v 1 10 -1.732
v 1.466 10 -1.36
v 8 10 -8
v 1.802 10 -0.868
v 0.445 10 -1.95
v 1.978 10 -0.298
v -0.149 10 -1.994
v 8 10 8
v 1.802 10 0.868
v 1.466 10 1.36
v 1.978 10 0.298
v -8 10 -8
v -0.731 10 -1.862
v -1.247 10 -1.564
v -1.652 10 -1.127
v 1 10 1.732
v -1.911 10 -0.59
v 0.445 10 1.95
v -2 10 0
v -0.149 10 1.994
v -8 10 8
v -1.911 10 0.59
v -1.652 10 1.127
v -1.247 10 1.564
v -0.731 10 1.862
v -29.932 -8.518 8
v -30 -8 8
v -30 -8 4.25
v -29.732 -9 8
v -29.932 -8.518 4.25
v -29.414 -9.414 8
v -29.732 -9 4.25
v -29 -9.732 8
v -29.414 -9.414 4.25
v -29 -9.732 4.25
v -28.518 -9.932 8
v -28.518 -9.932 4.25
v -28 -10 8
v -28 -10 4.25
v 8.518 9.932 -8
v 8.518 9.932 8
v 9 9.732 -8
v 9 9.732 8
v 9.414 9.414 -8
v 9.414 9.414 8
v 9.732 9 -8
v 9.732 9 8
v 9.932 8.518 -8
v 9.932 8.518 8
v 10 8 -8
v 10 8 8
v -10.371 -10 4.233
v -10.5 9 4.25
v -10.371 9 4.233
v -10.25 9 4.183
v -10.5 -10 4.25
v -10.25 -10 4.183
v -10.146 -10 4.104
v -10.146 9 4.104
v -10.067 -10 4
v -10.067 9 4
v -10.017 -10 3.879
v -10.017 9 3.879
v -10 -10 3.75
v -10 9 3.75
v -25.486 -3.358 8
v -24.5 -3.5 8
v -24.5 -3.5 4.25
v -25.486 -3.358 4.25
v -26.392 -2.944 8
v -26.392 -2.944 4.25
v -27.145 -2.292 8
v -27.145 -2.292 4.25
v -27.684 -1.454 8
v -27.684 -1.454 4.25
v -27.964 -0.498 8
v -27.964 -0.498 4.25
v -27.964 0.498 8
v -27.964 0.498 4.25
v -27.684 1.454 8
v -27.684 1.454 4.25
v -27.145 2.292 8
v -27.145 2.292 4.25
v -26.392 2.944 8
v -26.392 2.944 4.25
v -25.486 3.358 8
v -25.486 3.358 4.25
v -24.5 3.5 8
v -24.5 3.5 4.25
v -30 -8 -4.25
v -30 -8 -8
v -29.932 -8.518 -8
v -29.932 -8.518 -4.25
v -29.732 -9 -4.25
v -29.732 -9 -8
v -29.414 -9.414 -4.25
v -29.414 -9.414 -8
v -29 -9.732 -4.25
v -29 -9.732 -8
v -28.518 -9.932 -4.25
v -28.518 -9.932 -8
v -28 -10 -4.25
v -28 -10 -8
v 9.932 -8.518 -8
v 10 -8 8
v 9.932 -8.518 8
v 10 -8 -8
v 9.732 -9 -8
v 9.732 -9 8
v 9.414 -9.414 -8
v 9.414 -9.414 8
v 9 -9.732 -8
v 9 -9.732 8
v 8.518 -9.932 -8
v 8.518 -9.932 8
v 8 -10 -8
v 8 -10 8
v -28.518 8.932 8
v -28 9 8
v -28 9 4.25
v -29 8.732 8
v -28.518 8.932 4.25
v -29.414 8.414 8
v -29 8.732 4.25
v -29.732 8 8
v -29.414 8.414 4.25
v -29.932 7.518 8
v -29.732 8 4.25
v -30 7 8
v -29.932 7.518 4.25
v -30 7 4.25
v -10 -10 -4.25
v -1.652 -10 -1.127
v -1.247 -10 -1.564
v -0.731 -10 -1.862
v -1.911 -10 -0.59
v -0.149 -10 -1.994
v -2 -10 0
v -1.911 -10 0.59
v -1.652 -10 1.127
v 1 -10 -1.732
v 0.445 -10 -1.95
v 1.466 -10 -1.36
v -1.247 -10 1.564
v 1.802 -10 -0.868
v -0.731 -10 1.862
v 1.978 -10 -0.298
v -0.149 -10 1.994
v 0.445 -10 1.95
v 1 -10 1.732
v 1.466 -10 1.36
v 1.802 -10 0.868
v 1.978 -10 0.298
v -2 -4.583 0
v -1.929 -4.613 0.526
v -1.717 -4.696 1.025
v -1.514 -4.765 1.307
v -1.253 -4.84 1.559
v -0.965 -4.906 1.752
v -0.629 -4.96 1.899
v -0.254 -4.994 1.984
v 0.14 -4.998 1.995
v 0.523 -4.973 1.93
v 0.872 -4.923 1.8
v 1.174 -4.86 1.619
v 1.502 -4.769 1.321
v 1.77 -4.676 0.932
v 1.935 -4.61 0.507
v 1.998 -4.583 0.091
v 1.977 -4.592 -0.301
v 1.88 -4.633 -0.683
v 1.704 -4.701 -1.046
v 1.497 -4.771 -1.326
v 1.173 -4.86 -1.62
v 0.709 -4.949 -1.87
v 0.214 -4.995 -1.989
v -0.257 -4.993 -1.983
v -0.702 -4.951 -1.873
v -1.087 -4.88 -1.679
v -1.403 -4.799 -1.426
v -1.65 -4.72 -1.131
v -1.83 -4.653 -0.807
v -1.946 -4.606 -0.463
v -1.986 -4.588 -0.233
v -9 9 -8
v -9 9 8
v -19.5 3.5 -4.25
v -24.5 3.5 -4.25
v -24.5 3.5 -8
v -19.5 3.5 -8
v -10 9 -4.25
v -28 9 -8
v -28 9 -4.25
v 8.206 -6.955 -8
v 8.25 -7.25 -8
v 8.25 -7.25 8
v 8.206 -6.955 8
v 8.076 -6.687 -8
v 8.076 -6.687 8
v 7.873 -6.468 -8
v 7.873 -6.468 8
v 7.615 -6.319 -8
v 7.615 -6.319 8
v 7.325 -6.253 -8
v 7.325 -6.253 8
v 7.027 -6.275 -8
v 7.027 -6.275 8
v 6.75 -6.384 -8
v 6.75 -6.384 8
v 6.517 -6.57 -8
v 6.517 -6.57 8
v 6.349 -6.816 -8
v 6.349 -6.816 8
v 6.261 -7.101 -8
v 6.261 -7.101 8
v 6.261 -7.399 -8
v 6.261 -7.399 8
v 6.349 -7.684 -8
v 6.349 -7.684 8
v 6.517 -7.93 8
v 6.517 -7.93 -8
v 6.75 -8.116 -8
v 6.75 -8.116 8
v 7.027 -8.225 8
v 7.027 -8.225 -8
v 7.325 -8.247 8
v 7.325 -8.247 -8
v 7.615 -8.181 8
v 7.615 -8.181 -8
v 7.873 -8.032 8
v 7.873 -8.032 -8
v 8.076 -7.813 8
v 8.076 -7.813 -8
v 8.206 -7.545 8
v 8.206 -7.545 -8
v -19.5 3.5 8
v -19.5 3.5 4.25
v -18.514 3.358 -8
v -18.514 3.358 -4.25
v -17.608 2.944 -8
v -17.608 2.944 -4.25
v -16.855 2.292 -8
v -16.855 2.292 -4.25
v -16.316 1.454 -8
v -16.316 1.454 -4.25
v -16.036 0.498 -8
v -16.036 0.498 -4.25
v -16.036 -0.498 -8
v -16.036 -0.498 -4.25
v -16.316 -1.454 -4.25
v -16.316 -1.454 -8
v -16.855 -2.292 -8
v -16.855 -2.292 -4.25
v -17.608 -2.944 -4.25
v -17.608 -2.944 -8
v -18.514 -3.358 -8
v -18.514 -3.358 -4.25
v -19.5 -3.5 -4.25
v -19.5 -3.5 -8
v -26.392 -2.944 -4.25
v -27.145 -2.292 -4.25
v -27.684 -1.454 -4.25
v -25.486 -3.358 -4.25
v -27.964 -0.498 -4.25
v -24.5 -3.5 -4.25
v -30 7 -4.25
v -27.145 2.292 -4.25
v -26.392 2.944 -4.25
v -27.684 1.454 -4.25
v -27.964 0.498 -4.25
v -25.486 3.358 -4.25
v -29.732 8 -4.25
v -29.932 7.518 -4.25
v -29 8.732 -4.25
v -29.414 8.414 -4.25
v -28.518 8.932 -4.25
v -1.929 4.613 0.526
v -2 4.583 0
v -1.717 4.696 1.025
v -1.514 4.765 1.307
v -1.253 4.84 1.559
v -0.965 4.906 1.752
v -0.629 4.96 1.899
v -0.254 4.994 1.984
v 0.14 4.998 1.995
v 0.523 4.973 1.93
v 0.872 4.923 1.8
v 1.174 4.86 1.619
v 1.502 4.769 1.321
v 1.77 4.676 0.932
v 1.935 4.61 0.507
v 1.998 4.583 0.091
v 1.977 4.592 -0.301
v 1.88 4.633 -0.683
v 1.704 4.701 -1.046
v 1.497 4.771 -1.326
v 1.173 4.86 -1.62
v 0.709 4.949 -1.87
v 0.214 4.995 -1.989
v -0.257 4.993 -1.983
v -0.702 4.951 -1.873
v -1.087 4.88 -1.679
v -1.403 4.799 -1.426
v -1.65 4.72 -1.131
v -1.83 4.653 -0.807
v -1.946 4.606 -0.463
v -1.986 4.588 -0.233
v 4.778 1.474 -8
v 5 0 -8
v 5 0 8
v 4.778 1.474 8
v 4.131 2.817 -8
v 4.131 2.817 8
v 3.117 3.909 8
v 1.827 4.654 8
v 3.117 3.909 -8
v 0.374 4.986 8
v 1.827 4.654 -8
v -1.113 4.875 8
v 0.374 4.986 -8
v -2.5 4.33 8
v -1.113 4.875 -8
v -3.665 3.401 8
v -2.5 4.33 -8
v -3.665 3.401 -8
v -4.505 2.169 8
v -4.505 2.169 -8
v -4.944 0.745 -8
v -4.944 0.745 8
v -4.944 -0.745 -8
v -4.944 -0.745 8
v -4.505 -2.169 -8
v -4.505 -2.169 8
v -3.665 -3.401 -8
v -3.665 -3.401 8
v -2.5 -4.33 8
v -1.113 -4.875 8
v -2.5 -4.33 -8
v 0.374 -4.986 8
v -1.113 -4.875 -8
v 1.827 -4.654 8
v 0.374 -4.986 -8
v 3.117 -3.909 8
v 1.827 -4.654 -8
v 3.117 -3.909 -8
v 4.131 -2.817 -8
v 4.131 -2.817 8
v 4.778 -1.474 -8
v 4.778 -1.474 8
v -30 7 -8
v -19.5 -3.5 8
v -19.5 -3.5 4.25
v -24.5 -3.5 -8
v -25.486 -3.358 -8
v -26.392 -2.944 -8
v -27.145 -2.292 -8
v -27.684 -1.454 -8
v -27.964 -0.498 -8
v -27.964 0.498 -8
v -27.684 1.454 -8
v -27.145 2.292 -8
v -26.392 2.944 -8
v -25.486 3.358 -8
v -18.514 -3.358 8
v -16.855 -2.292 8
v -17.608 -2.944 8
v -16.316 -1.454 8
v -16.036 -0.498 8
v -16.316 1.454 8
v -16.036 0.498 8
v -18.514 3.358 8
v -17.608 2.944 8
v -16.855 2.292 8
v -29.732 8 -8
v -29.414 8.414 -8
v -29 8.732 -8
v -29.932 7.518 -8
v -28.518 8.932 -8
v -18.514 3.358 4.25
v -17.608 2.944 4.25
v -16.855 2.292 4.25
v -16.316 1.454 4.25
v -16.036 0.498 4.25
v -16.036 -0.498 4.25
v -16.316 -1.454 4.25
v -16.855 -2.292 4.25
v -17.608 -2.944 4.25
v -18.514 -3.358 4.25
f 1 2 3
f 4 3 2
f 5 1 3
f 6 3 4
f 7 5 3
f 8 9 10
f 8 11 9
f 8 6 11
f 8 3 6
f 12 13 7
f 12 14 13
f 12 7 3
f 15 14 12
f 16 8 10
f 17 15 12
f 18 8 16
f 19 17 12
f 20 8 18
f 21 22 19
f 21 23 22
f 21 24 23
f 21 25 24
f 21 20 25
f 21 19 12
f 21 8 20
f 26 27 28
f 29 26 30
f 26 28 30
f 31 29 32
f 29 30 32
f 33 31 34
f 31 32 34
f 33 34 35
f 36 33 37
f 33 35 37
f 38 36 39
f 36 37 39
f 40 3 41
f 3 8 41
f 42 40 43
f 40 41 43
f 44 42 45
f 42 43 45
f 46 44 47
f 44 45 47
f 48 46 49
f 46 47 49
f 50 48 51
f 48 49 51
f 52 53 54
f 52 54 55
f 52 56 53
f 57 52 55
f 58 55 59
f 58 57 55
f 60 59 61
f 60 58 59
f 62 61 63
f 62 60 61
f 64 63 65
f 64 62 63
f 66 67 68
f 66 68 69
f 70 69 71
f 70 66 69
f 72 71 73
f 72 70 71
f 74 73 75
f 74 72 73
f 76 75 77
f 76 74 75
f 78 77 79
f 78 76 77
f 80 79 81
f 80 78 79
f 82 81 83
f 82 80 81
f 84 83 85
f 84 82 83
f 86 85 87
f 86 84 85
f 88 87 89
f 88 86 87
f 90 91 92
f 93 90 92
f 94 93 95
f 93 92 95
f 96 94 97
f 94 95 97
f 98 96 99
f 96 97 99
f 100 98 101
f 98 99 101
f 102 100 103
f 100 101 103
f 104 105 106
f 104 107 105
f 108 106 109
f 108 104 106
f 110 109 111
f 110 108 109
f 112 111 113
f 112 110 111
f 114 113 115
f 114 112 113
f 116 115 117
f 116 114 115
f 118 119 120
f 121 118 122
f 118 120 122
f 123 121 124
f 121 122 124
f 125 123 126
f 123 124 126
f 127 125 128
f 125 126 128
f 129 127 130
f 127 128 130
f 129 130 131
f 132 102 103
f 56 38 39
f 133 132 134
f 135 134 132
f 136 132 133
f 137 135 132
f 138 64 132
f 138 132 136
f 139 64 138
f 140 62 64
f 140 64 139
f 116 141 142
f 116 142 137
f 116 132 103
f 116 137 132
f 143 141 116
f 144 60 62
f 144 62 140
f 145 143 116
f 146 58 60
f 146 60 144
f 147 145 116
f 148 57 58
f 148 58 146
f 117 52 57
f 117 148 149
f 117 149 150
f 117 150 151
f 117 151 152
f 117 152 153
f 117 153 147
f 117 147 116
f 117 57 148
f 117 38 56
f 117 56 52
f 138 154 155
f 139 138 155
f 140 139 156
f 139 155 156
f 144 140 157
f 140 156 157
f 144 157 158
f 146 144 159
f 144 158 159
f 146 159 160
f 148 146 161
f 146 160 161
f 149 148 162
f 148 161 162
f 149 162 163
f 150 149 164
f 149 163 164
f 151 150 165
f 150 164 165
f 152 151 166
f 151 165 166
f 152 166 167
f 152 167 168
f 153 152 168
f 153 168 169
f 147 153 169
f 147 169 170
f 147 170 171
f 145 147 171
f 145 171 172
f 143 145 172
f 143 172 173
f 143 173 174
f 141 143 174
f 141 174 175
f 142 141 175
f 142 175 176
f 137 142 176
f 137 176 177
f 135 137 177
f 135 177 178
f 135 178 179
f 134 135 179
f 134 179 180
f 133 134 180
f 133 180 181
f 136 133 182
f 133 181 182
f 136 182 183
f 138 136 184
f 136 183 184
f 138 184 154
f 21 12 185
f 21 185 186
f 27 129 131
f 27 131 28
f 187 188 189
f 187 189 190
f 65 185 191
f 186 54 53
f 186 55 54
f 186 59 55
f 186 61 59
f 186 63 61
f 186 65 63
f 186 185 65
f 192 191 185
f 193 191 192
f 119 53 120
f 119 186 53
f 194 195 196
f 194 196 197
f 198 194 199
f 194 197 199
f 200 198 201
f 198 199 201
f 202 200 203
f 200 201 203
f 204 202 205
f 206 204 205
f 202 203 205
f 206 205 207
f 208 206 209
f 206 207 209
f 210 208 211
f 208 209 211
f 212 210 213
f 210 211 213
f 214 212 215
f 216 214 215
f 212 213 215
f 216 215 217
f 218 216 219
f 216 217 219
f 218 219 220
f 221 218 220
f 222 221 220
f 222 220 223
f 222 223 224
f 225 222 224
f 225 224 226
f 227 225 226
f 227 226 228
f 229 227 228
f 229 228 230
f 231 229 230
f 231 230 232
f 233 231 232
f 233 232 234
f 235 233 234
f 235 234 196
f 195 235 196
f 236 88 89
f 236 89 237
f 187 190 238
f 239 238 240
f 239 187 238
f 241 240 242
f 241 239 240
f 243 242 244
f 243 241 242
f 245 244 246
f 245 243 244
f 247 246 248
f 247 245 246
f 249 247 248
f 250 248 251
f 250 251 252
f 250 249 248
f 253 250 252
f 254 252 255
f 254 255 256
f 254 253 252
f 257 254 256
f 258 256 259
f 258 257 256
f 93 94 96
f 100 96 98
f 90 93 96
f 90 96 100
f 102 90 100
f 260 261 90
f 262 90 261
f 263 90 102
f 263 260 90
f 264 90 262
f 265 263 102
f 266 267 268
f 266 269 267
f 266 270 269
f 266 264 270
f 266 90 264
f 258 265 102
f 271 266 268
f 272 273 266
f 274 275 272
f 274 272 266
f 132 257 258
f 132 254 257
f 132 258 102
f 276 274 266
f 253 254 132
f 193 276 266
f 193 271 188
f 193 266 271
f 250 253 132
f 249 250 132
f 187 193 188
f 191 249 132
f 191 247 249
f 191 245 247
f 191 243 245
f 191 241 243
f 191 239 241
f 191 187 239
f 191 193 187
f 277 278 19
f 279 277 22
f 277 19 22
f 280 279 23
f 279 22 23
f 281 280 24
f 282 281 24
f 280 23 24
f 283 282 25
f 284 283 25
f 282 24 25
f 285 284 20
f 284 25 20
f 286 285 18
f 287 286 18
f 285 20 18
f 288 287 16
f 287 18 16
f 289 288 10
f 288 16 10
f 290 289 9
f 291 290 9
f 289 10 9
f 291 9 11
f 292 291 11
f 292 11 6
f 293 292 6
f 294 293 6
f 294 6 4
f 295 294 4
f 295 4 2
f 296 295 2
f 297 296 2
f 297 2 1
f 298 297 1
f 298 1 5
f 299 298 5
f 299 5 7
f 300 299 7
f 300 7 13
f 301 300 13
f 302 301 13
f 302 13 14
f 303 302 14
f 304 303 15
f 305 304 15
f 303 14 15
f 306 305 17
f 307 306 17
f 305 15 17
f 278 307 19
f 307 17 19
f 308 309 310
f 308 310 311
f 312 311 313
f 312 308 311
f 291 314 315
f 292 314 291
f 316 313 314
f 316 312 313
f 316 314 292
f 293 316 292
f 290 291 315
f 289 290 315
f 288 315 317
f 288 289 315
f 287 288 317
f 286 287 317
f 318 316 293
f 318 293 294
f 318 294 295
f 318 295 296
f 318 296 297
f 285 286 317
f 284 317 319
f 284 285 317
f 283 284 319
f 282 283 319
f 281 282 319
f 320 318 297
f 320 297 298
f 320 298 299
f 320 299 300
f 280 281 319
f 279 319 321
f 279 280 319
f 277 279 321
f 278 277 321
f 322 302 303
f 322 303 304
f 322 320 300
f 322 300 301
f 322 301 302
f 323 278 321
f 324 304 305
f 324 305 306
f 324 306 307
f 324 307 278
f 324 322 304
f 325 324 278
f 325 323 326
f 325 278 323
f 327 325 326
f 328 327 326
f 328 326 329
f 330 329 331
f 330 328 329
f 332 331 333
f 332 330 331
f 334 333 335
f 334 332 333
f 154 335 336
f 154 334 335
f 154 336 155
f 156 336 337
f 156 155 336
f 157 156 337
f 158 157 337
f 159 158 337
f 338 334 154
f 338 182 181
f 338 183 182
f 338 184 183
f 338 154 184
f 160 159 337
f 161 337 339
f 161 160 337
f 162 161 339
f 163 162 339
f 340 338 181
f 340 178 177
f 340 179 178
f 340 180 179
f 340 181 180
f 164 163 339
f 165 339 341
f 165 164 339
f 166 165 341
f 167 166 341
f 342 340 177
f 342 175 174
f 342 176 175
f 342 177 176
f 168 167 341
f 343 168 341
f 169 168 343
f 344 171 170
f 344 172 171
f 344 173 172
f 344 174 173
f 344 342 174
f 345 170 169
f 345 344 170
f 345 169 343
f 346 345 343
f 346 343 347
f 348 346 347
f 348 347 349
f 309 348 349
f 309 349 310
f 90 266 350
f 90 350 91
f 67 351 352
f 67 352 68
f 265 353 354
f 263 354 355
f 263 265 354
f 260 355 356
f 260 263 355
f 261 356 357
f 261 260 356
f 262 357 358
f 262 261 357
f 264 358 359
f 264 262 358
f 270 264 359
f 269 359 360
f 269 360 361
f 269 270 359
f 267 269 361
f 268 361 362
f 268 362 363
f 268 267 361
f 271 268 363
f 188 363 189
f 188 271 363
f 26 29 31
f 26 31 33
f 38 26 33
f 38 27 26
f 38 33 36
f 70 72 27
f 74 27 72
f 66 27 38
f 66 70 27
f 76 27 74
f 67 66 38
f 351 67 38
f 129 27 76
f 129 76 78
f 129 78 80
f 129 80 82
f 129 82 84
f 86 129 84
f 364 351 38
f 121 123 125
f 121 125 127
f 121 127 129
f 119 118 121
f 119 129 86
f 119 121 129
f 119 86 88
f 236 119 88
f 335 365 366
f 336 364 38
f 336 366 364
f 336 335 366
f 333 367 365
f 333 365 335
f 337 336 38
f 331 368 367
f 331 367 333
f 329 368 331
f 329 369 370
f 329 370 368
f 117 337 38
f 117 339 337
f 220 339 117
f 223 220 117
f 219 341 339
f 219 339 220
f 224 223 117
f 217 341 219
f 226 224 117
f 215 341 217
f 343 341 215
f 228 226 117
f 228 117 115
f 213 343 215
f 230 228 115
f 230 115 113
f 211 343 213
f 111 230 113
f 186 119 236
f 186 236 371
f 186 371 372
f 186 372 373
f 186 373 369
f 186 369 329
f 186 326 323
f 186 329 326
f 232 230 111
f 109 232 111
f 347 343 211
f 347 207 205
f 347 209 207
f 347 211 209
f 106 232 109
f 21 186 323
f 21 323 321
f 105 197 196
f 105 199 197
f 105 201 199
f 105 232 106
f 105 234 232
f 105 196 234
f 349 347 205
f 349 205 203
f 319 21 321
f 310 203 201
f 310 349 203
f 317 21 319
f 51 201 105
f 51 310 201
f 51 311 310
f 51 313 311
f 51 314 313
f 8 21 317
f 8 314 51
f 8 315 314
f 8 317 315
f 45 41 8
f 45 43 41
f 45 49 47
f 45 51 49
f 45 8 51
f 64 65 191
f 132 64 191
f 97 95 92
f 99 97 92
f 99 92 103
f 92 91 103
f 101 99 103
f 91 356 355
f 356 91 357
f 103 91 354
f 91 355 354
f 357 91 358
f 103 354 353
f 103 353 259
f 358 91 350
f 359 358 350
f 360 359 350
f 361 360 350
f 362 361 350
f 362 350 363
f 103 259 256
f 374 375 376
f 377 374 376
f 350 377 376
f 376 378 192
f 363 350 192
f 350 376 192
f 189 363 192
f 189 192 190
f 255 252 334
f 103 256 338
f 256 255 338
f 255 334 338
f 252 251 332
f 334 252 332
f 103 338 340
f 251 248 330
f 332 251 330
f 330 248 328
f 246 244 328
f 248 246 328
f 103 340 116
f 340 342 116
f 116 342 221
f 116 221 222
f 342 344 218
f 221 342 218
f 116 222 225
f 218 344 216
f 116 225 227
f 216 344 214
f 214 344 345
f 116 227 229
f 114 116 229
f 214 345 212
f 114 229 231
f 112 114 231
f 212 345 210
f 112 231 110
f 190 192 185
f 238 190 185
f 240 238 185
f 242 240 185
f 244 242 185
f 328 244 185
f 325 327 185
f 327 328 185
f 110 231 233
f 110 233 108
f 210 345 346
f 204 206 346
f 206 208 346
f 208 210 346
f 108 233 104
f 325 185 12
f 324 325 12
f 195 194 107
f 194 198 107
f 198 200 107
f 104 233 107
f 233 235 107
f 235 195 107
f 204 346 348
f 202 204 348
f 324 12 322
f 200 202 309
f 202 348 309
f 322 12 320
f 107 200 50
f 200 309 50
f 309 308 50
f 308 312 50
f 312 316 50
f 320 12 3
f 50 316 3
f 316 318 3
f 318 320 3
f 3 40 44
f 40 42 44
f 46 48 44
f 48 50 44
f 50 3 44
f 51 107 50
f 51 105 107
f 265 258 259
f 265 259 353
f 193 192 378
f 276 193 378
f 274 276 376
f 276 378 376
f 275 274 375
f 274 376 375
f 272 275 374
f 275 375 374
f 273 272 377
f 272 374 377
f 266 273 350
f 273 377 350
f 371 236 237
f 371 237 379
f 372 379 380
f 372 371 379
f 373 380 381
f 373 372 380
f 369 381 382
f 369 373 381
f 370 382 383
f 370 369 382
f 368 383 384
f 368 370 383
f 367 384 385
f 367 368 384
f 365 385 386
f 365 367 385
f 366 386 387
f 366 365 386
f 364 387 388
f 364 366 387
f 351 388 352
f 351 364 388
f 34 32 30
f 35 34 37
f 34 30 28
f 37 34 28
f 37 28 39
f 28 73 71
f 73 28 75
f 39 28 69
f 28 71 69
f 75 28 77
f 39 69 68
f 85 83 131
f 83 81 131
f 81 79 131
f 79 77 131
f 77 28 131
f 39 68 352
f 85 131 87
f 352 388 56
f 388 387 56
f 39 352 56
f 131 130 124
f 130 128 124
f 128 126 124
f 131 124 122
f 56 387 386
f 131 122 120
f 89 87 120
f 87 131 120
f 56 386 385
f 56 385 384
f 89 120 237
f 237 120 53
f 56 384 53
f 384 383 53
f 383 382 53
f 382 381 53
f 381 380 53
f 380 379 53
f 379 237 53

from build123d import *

# Parameters (mm, degrees)
SKETCH_1_R          = 5
EXTRUDE_1_DEPTH     = 8
CHAMFER_1_SIZE      = 1
FILLET_1_R          = 2
SKETCH_2_W          = 20
SKETCH_2_H          = 8.5
CUT_EXTRUDE_1_DEPTH = 37.400549446
SKETCH_3_R          = 1
CUT_EXTRUDE_2_DEPTH = 36.440090293
FILLET_2_R          = 0.5
SKETCH_4_R          = 2
CUT_EXTRUDE_3_DEPTH = 37.932370625


with BuildPart() as part:
    # 草图1 → 凸台-拉伸1 (new, symmetric)
    with BuildSketch(Plane.XY):
        Polygon((-10, -10), (10, -10), (10, 10), (-8, 10), (-8, 9), (-10, 9), (-30, 9), (-30, -10), align=None)
        Circle(SKETCH_1_R, mode=Mode.SUBTRACT)
        with BuildLine():
            Line((-24.5, 3.5), (-19.5, 3.5))
            ThreePointArc((-19.5, 3.5), (-16, 0), (-19.5, -3.5))
            Line((-19.5, -3.5), (-24.5, -3.5))
            ThreePointArc((-24.5, -3.5), (-28, 0), (-24.5, 3.5))
        make_face(mode=Mode.SUBTRACT)
    extrude(amount=EXTRUDE_1_DEPTH, both=True)

    # 倒角1
    chamfer_1_edges = [part.edges().sort_by_distance(p)[0] for p in [
        (-8, 9, 0),
    ]]
    chamfer(chamfer_1_edges, length=CHAMFER_1_SIZE - 0.0001)  # a hair under: the kernel refuses the full size

    # 圆角1
    fillet_1_edges = [part.edges().sort_by_distance(p)[0] for p in [
        (10, -10, 0),
        (-30, -10, 0),
        (-30, 9, 0),
        (10, 10, 0),
    ]]
    fillet(fillet_1_edges, radius=FILLET_1_R)

    # 草图2 → 切除-拉伸1 (cut, through all)
    with BuildSketch(Plane(origin=(0, 9, 0), x_dir=(1, 0, 0), z_dir=(0, 1, 0))):
        with Locations((-20, 0)):
            Rectangle(SKETCH_2_W, SKETCH_2_H)
    extrude(amount=-CUT_EXTRUDE_1_DEPTH, mode=Mode.SUBTRACT)

    # 草图3 → 切除-拉伸2 (cut, through all)
    with BuildSketch(Plane.XY.offset(8)):
        with Locations((7.25, -7.25)):
            Circle(SKETCH_3_R)
    extrude(amount=-CUT_EXTRUDE_2_DEPTH, mode=Mode.SUBTRACT)

    # 圆角2
    fillet_2_edges = [part.edges().sort_by_distance(p)[0] for p in [
        (-10, -0.5, 4.25),
    ]]
    fillet(fillet_2_edges, radius=FILLET_2_R)

    # 草图4 → 切除-拉伸3 (cut, through all)
    with BuildSketch(Plane(origin=(0, 10, 0), x_dir=(1, 0, 0), z_dir=(0, 1, 0))):
        with Locations(Location((0, 0, 0), (0, 0, 180))):
            Circle(SKETCH_4_R)
    extrude(amount=-CUT_EXTRUDE_3_DEPTH, mode=Mode.SUBTRACT)


solid = part.part
